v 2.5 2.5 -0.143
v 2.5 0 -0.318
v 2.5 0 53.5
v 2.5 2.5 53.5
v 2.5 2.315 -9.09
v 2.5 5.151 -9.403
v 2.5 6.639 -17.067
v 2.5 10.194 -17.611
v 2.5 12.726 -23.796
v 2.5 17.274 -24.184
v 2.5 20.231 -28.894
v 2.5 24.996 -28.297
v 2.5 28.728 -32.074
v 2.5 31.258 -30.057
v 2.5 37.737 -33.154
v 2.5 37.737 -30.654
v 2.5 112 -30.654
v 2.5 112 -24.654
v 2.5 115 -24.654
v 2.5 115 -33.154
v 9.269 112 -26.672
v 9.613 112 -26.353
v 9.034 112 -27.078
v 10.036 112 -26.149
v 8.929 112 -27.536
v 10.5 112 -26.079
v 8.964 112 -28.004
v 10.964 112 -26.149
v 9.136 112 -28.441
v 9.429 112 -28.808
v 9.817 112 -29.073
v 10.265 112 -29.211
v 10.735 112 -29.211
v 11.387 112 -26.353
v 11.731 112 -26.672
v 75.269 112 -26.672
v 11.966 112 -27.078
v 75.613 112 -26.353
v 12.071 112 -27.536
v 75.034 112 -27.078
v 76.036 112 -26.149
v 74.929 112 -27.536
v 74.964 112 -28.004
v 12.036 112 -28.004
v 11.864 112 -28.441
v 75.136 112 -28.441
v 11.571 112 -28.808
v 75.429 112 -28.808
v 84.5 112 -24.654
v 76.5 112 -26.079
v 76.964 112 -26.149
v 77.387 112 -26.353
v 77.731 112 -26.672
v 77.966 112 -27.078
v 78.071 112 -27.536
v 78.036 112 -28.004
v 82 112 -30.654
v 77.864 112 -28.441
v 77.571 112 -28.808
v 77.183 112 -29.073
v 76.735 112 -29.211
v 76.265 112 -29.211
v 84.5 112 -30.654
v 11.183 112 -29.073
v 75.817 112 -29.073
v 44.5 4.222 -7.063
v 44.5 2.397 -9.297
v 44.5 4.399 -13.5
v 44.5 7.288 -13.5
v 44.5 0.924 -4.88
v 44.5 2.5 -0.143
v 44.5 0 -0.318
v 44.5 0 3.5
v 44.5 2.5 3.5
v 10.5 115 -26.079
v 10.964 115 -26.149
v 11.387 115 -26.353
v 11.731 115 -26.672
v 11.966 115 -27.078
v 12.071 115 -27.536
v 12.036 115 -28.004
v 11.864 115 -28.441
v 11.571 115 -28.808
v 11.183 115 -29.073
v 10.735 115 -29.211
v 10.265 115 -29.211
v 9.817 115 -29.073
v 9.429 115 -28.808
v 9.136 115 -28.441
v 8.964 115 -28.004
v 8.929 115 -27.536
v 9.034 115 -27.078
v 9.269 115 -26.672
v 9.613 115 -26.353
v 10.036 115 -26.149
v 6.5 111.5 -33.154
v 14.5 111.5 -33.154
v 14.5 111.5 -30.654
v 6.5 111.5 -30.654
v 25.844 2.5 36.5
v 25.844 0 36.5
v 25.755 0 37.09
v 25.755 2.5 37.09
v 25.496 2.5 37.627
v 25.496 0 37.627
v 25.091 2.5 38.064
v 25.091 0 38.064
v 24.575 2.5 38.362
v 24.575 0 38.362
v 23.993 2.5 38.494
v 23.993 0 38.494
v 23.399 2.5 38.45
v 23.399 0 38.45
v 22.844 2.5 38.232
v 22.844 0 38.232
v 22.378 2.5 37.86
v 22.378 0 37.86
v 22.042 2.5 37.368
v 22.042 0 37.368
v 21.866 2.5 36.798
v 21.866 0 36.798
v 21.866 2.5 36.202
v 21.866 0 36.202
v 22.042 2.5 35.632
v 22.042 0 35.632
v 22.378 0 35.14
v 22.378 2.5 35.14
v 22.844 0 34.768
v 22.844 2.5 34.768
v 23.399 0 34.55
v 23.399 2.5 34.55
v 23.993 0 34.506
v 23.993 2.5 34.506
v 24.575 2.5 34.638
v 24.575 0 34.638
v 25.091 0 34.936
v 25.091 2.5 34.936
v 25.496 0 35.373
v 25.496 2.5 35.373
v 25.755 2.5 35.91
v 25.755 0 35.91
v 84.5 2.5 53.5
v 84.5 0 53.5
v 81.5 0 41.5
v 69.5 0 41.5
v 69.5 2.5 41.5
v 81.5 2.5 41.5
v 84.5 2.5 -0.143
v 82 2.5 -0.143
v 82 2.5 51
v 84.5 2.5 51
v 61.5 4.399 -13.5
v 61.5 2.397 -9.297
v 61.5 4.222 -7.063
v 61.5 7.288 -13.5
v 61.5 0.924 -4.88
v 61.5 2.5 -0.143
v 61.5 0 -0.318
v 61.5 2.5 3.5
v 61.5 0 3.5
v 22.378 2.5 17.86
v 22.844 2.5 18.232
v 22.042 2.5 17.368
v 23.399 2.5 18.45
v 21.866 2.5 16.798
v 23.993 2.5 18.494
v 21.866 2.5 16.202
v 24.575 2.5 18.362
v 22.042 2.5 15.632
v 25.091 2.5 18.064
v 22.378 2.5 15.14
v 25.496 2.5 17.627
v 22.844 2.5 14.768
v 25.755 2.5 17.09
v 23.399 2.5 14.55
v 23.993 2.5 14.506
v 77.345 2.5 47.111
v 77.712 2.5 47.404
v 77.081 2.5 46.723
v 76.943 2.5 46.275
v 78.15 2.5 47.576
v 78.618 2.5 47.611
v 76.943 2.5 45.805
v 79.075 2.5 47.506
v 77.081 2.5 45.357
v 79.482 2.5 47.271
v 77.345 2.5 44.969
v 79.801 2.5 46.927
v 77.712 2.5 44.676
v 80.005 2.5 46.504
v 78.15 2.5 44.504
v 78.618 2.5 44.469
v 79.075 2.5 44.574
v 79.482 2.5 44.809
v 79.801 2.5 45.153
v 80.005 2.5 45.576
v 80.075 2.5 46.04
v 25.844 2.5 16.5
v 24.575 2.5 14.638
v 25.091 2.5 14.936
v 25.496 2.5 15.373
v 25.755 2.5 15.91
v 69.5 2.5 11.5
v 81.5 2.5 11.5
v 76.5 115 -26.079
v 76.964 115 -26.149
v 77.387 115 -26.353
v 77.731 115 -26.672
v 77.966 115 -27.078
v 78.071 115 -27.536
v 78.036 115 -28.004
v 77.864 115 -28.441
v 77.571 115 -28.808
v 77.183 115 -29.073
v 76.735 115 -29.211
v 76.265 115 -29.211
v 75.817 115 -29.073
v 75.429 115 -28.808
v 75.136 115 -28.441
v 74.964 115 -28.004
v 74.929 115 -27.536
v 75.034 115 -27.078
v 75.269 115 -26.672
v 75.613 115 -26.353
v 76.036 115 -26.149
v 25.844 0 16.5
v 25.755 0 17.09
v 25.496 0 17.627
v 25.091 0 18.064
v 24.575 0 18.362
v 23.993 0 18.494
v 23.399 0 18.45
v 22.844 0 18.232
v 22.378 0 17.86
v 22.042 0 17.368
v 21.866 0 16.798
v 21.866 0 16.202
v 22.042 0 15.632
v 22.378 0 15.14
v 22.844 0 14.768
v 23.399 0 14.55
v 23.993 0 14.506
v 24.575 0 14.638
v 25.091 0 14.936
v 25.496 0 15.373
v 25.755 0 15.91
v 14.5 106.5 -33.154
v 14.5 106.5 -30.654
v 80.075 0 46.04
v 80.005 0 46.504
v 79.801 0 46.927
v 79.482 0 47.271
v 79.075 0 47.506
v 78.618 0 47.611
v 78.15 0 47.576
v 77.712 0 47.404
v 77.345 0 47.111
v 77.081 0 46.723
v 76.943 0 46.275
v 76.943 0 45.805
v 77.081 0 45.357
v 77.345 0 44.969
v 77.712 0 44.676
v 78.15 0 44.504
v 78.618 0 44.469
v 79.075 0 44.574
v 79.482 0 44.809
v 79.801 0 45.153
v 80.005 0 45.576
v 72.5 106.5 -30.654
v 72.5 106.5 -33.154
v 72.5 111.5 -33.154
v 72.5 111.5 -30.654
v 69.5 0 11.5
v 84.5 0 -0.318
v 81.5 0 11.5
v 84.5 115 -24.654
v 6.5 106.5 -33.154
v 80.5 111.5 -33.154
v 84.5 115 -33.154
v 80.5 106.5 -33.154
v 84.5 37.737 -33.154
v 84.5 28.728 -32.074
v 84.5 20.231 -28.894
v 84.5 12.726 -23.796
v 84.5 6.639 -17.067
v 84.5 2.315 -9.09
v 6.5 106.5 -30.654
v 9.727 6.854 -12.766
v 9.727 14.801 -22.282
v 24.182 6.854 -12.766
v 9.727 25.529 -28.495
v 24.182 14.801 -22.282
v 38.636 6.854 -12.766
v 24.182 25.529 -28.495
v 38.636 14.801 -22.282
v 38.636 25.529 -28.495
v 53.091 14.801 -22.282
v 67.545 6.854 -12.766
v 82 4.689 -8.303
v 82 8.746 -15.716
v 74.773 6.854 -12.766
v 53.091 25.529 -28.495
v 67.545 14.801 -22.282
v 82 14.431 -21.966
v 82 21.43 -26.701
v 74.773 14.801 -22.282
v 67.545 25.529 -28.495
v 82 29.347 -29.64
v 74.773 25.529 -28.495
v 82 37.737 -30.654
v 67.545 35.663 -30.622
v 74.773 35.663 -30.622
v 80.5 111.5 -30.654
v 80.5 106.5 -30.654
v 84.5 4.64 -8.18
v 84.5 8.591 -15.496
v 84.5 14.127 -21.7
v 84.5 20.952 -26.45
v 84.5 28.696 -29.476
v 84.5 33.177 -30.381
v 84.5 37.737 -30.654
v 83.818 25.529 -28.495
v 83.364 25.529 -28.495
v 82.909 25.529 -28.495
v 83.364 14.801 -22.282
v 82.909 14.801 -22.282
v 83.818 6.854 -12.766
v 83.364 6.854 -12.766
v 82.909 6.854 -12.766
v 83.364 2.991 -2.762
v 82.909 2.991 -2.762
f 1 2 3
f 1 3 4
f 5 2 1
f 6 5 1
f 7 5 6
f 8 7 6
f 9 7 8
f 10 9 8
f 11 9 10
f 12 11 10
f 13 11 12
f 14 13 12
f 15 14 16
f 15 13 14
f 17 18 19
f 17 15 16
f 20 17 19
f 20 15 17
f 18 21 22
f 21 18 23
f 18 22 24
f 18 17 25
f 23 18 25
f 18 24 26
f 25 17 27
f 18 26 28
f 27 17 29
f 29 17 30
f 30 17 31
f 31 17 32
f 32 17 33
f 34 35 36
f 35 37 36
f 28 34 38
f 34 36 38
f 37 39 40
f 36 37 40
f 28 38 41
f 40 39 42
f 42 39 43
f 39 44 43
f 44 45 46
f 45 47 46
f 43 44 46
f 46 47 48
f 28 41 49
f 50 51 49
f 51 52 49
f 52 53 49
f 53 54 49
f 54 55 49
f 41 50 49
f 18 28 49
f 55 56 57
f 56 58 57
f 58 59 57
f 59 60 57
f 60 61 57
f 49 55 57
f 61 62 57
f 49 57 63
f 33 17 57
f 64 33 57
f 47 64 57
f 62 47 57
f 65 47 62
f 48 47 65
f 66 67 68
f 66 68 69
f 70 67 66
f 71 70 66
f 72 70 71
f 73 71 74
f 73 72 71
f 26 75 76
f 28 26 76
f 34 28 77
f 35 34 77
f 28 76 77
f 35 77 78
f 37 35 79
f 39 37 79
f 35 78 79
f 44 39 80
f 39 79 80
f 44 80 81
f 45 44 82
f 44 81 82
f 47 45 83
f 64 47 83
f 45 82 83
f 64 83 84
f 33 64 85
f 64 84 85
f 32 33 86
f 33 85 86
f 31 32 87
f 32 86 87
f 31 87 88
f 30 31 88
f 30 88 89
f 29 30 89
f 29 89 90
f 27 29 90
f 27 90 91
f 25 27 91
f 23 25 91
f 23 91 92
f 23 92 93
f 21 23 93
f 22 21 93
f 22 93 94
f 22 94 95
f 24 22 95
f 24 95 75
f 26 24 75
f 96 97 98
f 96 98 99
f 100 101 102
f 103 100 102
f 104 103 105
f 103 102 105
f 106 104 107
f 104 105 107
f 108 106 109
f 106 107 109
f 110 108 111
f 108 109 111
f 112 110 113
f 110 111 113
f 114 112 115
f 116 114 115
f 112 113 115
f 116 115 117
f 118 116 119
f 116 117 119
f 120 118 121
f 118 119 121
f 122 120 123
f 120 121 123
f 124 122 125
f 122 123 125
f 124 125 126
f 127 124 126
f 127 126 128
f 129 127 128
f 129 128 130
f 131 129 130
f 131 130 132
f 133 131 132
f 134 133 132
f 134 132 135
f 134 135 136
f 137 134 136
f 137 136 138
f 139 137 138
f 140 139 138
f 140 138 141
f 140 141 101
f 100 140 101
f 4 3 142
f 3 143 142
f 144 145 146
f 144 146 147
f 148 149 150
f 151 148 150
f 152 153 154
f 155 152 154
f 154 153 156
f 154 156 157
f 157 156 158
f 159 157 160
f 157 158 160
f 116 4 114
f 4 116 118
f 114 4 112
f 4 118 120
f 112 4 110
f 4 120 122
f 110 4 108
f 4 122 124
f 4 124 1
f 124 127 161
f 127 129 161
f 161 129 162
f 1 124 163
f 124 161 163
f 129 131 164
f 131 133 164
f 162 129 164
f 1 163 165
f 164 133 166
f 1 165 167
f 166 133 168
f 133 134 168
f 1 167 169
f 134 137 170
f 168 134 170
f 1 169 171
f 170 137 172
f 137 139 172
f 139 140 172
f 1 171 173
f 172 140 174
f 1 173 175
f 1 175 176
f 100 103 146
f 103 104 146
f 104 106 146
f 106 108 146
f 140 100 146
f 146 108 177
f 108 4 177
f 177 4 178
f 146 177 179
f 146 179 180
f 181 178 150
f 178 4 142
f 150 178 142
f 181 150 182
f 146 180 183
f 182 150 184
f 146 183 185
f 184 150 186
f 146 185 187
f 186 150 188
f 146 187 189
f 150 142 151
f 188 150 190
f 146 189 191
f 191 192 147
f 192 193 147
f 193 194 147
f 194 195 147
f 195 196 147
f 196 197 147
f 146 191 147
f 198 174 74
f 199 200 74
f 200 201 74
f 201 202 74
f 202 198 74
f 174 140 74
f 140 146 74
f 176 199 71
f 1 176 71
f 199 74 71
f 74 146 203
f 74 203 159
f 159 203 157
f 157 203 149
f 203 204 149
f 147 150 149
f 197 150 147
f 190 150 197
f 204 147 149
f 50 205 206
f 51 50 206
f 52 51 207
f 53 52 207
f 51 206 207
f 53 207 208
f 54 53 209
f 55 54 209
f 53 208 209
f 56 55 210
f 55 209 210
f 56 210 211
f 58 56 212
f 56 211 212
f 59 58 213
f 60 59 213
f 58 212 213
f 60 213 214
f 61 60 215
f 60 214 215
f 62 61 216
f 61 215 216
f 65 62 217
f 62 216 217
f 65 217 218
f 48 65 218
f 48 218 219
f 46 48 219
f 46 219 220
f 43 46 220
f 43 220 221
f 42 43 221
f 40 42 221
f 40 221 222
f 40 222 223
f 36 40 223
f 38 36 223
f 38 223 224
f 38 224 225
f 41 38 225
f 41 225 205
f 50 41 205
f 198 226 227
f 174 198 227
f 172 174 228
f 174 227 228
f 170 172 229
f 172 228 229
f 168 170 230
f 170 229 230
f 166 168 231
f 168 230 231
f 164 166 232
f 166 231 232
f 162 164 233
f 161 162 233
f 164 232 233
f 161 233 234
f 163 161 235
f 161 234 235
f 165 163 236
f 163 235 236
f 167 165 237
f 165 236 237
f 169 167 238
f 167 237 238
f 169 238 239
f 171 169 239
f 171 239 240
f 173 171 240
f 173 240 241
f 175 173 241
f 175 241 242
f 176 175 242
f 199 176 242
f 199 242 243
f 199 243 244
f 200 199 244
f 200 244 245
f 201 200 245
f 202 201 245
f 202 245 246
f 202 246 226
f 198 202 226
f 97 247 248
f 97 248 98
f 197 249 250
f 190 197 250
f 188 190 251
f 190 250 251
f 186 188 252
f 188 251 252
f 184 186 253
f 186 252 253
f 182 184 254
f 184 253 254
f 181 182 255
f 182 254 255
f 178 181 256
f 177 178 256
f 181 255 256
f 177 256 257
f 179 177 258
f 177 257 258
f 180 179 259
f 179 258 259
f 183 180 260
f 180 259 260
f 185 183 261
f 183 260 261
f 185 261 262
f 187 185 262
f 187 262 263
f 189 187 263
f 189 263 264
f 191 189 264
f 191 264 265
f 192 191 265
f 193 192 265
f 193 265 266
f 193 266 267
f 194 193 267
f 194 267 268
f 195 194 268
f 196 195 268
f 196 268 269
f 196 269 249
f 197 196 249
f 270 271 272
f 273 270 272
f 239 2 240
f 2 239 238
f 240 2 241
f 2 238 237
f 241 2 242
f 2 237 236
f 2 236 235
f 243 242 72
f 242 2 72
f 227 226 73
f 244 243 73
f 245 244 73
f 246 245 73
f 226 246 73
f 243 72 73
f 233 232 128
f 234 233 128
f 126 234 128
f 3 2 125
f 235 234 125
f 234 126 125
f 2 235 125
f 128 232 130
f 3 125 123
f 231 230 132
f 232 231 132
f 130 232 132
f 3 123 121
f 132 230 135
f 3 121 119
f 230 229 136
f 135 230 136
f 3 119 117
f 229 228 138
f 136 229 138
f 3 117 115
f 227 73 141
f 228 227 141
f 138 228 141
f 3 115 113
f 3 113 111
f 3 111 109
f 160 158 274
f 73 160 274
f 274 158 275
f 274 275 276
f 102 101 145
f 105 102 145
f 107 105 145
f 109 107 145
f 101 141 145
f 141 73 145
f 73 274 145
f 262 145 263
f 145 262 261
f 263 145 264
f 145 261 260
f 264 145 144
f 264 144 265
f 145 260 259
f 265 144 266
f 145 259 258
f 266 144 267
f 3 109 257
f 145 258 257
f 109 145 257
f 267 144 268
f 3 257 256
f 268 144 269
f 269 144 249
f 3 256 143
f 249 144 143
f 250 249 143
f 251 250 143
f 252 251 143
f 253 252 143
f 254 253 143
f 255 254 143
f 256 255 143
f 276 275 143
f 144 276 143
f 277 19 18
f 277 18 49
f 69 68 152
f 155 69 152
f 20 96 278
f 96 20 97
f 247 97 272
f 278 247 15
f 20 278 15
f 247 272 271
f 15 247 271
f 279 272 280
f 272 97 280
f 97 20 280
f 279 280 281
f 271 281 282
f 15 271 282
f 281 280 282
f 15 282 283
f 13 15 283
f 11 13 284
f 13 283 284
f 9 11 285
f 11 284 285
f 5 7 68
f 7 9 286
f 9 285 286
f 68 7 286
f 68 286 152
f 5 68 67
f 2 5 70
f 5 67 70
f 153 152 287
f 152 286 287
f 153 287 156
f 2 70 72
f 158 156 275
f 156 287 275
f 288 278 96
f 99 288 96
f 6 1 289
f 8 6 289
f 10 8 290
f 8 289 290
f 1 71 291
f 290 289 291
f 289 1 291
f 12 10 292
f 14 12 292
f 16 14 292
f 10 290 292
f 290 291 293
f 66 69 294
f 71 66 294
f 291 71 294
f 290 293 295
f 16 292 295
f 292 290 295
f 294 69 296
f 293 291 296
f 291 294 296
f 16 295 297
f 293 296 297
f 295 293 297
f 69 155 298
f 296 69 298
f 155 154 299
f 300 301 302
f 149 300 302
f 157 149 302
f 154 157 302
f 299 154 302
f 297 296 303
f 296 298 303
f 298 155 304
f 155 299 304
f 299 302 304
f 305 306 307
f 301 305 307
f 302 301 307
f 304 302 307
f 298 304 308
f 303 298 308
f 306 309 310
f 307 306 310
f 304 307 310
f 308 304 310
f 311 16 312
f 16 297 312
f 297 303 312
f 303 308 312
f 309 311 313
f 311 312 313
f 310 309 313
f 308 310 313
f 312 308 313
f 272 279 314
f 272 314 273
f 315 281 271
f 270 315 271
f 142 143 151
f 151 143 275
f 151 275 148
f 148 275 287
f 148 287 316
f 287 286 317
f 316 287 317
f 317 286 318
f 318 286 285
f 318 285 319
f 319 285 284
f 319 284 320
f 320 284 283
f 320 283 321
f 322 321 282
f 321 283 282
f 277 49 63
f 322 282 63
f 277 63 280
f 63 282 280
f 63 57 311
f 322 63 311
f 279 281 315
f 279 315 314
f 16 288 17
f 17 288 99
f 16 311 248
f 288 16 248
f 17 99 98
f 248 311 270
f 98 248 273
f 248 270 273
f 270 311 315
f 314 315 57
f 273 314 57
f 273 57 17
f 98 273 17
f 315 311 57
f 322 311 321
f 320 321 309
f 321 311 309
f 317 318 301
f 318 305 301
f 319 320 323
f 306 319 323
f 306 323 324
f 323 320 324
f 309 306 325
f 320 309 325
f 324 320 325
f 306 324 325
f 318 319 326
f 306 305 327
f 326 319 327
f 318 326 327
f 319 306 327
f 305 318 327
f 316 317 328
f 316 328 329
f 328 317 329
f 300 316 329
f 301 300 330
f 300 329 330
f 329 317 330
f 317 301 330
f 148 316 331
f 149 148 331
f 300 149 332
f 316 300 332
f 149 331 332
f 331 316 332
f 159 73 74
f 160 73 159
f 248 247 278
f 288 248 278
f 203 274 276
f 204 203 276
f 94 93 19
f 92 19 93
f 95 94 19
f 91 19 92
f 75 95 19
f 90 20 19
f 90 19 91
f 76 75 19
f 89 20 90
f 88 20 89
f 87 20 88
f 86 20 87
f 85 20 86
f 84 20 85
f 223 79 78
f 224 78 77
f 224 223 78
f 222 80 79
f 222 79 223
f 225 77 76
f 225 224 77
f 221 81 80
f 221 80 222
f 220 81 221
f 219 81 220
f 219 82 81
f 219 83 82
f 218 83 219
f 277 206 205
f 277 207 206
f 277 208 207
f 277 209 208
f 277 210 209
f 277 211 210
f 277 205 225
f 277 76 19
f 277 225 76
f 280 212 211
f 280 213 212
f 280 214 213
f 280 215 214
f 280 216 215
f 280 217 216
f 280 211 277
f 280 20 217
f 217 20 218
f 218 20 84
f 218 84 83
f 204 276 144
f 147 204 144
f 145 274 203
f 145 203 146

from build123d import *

# Parameters (mm, degrees)
BOSS_EXTRUDE1_DEPTH      = 50
SKETCH3_W                = 92
SKETCH3_H                = 120
BOSS_EXTRUDE2_DEPTH      = 5
SKETCH4_W                = 8.115199035
SKETCH4_H                = 120
BOSS_EXTRUDE3_DEPTH      = 12
BOSS_EXTRUDE4_DEPTH      = 60
SKETCH5_W                = 10
SKETCH5_H                = 2
BOSS_EXTRUDE5_DEPTH      = 20
BOSS_EXTRUDE6_START      = 50
SKETCH5_2_W              = 10
SKETCH5_2_H              = 2
BOSS_EXTRUDE6_DEPTH      = 20
SKETCH6_W                = 92
SKETCH6_H                = 120
BOSS_EXTRUDE7_DEPTH      = 5
SKETCH7_W                = 7
SKETCH7_H                = 10
SKETCH7_R                = 1.6
BOSS_EXTRUDE8_DEPTH      = 3
CUT_EXTRUDE2_DEPTH       = 164.816971038
SKETCH12_W               = 112.5
SKETCH12_H               = 2.5
CUT_EXTRUDE4_DEPTH       = 165.373051319
CUT_EXTRUDE4_DEPTH_BACK  = 165.373051319
SKETCH14_W               = 106
SKETCH14_H               = 1.5
CUT_EXTRUDE5_DEPTH       = 162.085381087
SKETCH15_R               = 1.6
BOSS_EXTRUDE10_DEPTH     = 2
SKETCH16_W               = 87
SKETCH16_H               = 3.364665628
CUT_EXTRUDE6_DEPTH       = 162.085381087
SKETCH17_W               = 10
SKETCH17_H               = 2
CUT_EXTRUDE7_DEPTH       = 70
SKETCH19_W               = 7
SKETCH19_H               = 10
SKETCH19_R               = 1.6
BOSS_EXTRUDE11_DEPTH     = 3.5
SKETCH21_W               = 7
SKETCH21_H               = 10
SKETCH21_R               = 1.6
BOSS_EXTRUDE13_DEPTH     = 3.5
SKETCH22_W               = 9.5
SKETCH22_H               = 117.5
CUT_EXTRUDE8_DEPTH       = 186.007067988
CUT_EXTRUDE9_DEPTH       = 156.903445849
CUT_EXTRUDE10_START      = -8.115199
SKETCH26_W               = 12
SKETCH26_H               = 12
CUT_EXTRUDE10_DEPTH      = 8.115199
SKETCH27_R               = 1.575
CUT_EXTRUDE11_DEPTH      = 6
SKETCH28_W               = 108.793725607
SKETCH28_H               = 128.432707594
CUT_EXTRUDE12_DEPTH      = 155.300842512
CUT_EXTRUDE13_DEPTH      = 127.920694069
CUT_EXTRUDE14_DEPTH      = 130.130747828
BOSS_EXTRUDE14_DEPTH     = 79.5
SKETCH32_W               = 2.5
SKETCH32_H               = 2.5
CUT_EXTRUDE15_DEPTH      = 153.946069092
SKETCH35_R               = 1.575
CUT_EXTRUDE16_DEPTH      = 153.405708721
SKETCH36_W               = 82
SKETCH36_H               = 3
BOSS_EXTRUDE15_DEPTH     = 6
CUT_EXTRUDE17_REACH      = 154.406
SKETCH37_R               = 1.575
SKETCH38_W               = 17
SKETCH38_H               = 17
CUT_EXTRUDE18_DEPTH      = 153.405708721
CUT_EXTRUDE18_DEPTH_BACK = 153.405708721
SKETCH39_W               = 12
SKETCH39_H               = 30
CUT_EXTRUDE19_DEPTH      = 153.405708721
CUT_EXTRUDE20_REACH      = 168.956
SKETCH40_W               = 8
SKETCH40_H               = 5
CUT_EXTRUDE22_REACH      = 154.406
SKETCH42_R               = 2


with BuildPart() as part:
    # Sketch2 → Boss-Extrude1 (new body)
    with BuildSketch(Plane.XY):
        Polygon((0, 0), (0, 115), (82, 115), (82, 0), (87, 0), (87, 120), (-5, 120), (-5, 0), align=None)
    extrude(amount=BOSS_EXTRUDE1_DEPTH)

    # Sketch3 → Boss-Extrude2 (add)
    with BuildSketch(Plane.XY.offset(50)):
        with Locations((41, 60)):
            Rectangle(SKETCH3_W, SKETCH3_H)
    extrude(amount=BOSS_EXTRUDE2_DEPTH)

    # Sketch4 → Boss-Extrude3 (add)
    with BuildSketch(Plane.ZY.offset(-82)):
        with Locations((45.942400483, 60)):
            Rectangle(SKETCH4_W, SKETCH4_H)
    extrude(amount=BOSS_EXTRUDE3_DEPTH)

    # Sketch2_2 → Boss-Extrude4 (add)
    with BuildSketch(Plane.XY):
        Polygon((0, 0), (0, 115), (82, 115), (82, 0), (87, 0), (87, 120), (-5, 120), (-5, 0), align=None)
    extrude(amount=-BOSS_EXTRUDE4_DEPTH)

    # Sketch5 → Boss-Extrude5 (add)
    with BuildSketch(Plane.XZ.offset(-115)):
        with Locations((5, 7.889828052)):
            Rectangle(SKETCH5_W, SKETCH5_H)
        with Locations((5, 2.689828052)):
            Rectangle(SKETCH5_W, SKETCH5_H)
        with Locations((77, 2.689828052)):
            Rectangle(SKETCH5_W, SKETCH5_H)
        with Locations((77, 7.889828052)):
            Rectangle(SKETCH5_W, SKETCH5_H)
    extrude(amount=BOSS_EXTRUDE5_DEPTH)

    # Sketch5_2 → Boss-Extrude6 (add)
    with BuildSketch(Plane.XZ.offset(-115).offset(BOSS_EXTRUDE6_START)):
        with Locations((5, 7.889828052)):
            Rectangle(SKETCH5_2_W, SKETCH5_2_H)
        with Locations((5, 2.689828052)):
            Rectangle(SKETCH5_2_W, SKETCH5_2_H)
        with Locations((77, 2.689828052)):
            Rectangle(SKETCH5_2_W, SKETCH5_2_H)
        with Locations((77, 7.889828052)):
            Rectangle(SKETCH5_2_W, SKETCH5_2_H)
    extrude(amount=BOSS_EXTRUDE6_DEPTH)

    # Sketch6 → Boss-Extrude7 (add)
    with BuildSketch(Plane(origin=(0, 0, -60), x_dir=(-1, 0, 0), z_dir=(0, 0, -1))):
        with Locations((-41, 60)):
            Rectangle(SKETCH6_W, SKETCH6_H)
    extrude(amount=-BOSS_EXTRUDE7_DEPTH)

    # Sketch7 → Boss-Extrude8 (add)
    with BuildSketch(Plane.XY.offset(55)):
        with Locations((90.5, 115)):
            Rectangle(SKETCH7_W, SKETCH7_H)
        with Locations((90.472155735, 113.006992181)):
            Circle(SKETCH7_R, mode=Mode.SUBTRACT)
        with Locations((-8.5, 115)):
            Rectangle(SKETCH7_W, SKETCH7_H)
        with Locations(Location((-8.472155735, 113.006992181, 0), (0, 0, 180))):
            Circle(SKETCH7_R, mode=Mode.SUBTRACT)
        with Locations((-8.5, 5)):
            Rectangle(SKETCH7_W, SKETCH7_H)
        with Locations((-8.472155735, 6.993007819)):
            Circle(SKETCH7_R, mode=Mode.SUBTRACT)
        with Locations((90.5, 5)):
            Rectangle(SKETCH7_W, SKETCH7_H)
        with Locations(Location((90.472155735, 6.993007819, 0), (0, 0, 180))):
            Circle(SKETCH7_R, mode=Mode.SUBTRACT)
    extrude(amount=-BOSS_EXTRUDE8_DEPTH)

    # Sketch11 → Cut-Extrude2 (cut, through all)
    with BuildSketch(Plane.XZ):
        Polygon((-5, 52), (-2.5, 52), (-2.5, -57.5), (84.5, -57.5), (84.5, 52), (87, 52), (87, -60), (-5, -60), align=None)
    extrude(amount=-CUT_EXTRUDE2_DEPTH, mode=Mode.SUBTRACT)

    # Sketch12 → Cut-Extrude4 (cut, two sides)
    with BuildSketch(Plane.ZY.offset(2.5)) as cut_extrude4_sk:
        with Locations((-1.25, 118.75)):
            Rectangle(SKETCH12_W, SKETCH12_H)
    extrude(amount=CUT_EXTRUDE4_DEPTH, mode=Mode.SUBTRACT)
    extrude(cut_extrude4_sk.sketch, amount=-CUT_EXTRUDE4_DEPTH_BACK, mode=Mode.SUBTRACT)

    # Sketch14 → Cut-Extrude5 (cut, through all)
    with BuildSketch(Plane.XZ):
        with Locations((41, 54.25)):
            Rectangle(SKETCH14_W, SKETCH14_H)
    extrude(amount=-CUT_EXTRUDE5_DEPTH, mode=Mode.SUBTRACT)

    # Sketch15 → Boss-Extrude10 (add)
    with BuildSketch(Plane(origin=(0, 0, 52), x_dir=(-1, 0, 0), z_dir=(0, 0, -1))):
        Polygon((-84.5, 117.5), (-94, 117.5), (-94, 110), (-87, 110), (-87, 10), (-94, 10), (-94, 0), (-84.5, 0), align=None)
        with Locations((-90.472155735, 113.006992181)):
            Circle(SKETCH15_R, mode=Mode.SUBTRACT)
        with Locations((-90.472155735, 6.993007819)):
            Circle(SKETCH15_R, mode=Mode.SUBTRACT)
        Polygon((2.5, 0), (2.5, 117.5), (12, 117.5), (12, 110), (5, 110), (5, 10), (12, 10), (12, 0), align=None)
        with Locations(Location((8.472155735, 113.006992181, 0), (0, 0, 180))):
            Circle(SKETCH15_R, mode=Mode.SUBTRACT)
        with Locations(Location((8.472155735, 6.993007819, 0), (0, 0, 180))):
            Circle(SKETCH15_R, mode=Mode.SUBTRACT)
    extrude(amount=BOSS_EXTRUDE10_DEPTH)

    # Sketch16 → Cut-Extrude6 (cut, through all)
    with BuildSketch(Plane.XZ):
        with Locations((41, -55.817667186)):
            Rectangle(SKETCH16_W, SKETCH16_H)
    extrude(amount=-CUT_EXTRUDE6_DEPTH, mode=Mode.SUBTRACT)

    # Sketch17 → Cut-Extrude7 (cut)
    with BuildSketch(Plane.XZ.offset(-45)):
        with Locations((5, 2.689828052)):
            Rectangle(SKETCH17_W, SKETCH17_H)
        with Locations((77, 2.689828052)):
            Rectangle(SKETCH17_W, SKETCH17_H)
    extrude(amount=-CUT_EXTRUDE7_DEPTH, mode=Mode.SUBTRACT)

    # Sketch19 → Boss-Extrude11 (add)
    with BuildSketch(Plane.XZ):
        with Locations((88, -49.135334372)):
            Rectangle(SKETCH19_W, SKETCH19_H)
        with Locations((87.901562489, -49.234834013)):
            Circle(SKETCH19_R, mode=Mode.SUBTRACT)
        with Locations((-6, -49.135334372)):
            Rectangle(SKETCH19_W, SKETCH19_H)
        with Locations(Location((-5.901562489, -49.234834013, 0), (0, 0, 180))):
            Circle(SKETCH19_R, mode=Mode.SUBTRACT)
        with Locations((-6, 34.080676656)):
            Rectangle(SKETCH19_W, SKETCH19_H)
        with Locations((-5.901562489, 34.180176298)):
            Circle(SKETCH19_R, mode=Mode.SUBTRACT)
        with Locations((88, 34.080676656)):
            Rectangle(SKETCH19_W, SKETCH19_H)
        with Locations(Location((87.901562489, 34.180176298, 0), (0, 0, 180))):
            Circle(SKETCH19_R, mode=Mode.SUBTRACT)
    extrude(amount=-BOSS_EXTRUDE11_DEPTH)

    # Sketch21 → Boss-Extrude13 (add)
    with BuildSketch(Plane(origin=(0, 0, -54.135334372), x_dir=(-1, 0, 0), z_dir=(0, 0, -1))):
        with Locations((-88, 112.5)):
            Rectangle(SKETCH21_W, SKETCH21_H)
        with Locations((-87.460864154, 112.996655596)):
            Circle(SKETCH21_R, mode=Mode.SUBTRACT)
        with Locations((6, 112.5)):
            Rectangle(SKETCH21_W, SKETCH21_H)
        with Locations(Location((5.460864154, 112.996655596, 0), (0, 0, 180))):
            Circle(SKETCH21_R, mode=Mode.SUBTRACT)
        with Locations((6, 17.859776919)):
            Rectangle(SKETCH21_W, SKETCH21_H)
        with Locations((5.460864154, 17.363121322)):
            Circle(SKETCH21_R, mode=Mode.SUBTRACT)
        with Locations((-88, 17.859776919)):
            Rectangle(SKETCH21_W, SKETCH21_H)
        with Locations(Location((-87.460864154, 17.363121322, 0), (0, 0, 180))):
            Circle(SKETCH21_R, mode=Mode.SUBTRACT)
    extrude(amount=-BOSS_EXTRUDE13_DEPTH)

    # Sketch22 → Cut-Extrude8 (cut, through all)
    with BuildSketch(Plane(origin=(0, 0, -54.135334372), x_dir=(-1, 0, 0), z_dir=(0, 0, -1))):
        with Locations((7.25, 58.75)):
            Rectangle(SKETCH22_W, SKETCH22_H)
        with Locations((-89.25, 58.75)):
            Rectangle(SKETCH22_W, SKETCH22_H)
    extrude(amount=-CUT_EXTRUDE8_DEPTH, mode=Mode.SUBTRACT)

    # Sketch24 → Cut-Extrude9 (cut, through all)
    with BuildSketch(Plane.ZY.offset(2.5)):
        with BuildLine():
            Line((-33.153862192, 117.5), (-33.153862192, 37.737088179))
            ThreePointArc((-33.153862192, 37.737088179), (-23.795591024, 12.725573197), (-0.317667186, 0))
            Line((-0.317667186, 0), (-54.135334372, 0))
            Line((-54.135334372, 0), (-54.135334372, 117.5))
            Line((-54.135334372, 117.5), (-33.153862192, 117.5))
        make_face()
    extrude(amount=-CUT_EXTRUDE9_DEPTH, mode=Mode.SUBTRACT)

    # Sketch26 → Cut-Extrude10 (cut)
    with BuildSketch(Plane(origin=(0, 0, 41.884800965), x_dir=(-1, 0, 0), z_dir=(0, 0, -1)).offset(CUT_EXTRUDE10_START)):
        with Locations((-76, 12)):
            Rectangle(SKETCH26_W, SKETCH26_H)
    extrude(amount=CUT_EXTRUDE10_DEPTH, mode=Mode.SUBTRACT)

    # Sketch27 → Cut-Extrude11 (cut)
    with BuildSketch(Plane.XZ):
        with Locations((76, 46.036602525)):
            Circle(SKETCH27_R)
    extrude(amount=-CUT_EXTRUDE11_DEPTH, mode=Mode.SUBTRACT)

    # Sketch28 → Cut-Extrude12 (cut, through all)
    with BuildSketch(Plane.ZY.offset(-82)):
        with Locations((9.705474095, 56.879620763)):
            Rectangle(SKETCH28_W, SKETCH28_H)
    extrude(amount=CUT_EXTRUDE12_DEPTH, mode=Mode.SUBTRACT)

    # 3DSketch1 → Cut-Extrude13 (cut, through all)
    with BuildSketch(Plane(origin=(82, 2.5, -0.143383403), x_dir=(0, 0.9103450776109693, 0.41385002074360044), z_dir=(-1, 0, 0))):
        with BuildLine():
            Line((0, 0), (21.165690282, -46.558127334))
            Line((21.165690282, -46.558127334), (123.579511514, 0))
            Line((123.579511514, 0), (89.787058952, 74.333191514))
            Line((89.787058952, 74.333191514), (19.451147493, 42.357933854))
            add(Edge.make_bspline(
                [(19.451147493, 42.357933854), (19.073503164, 42.186253777), (18.695858835, 42.0145737), (18.319593589, 41.840000931), (17.199072345, 41.298926476), (16.11578633, 40.679749356), (15.408613466, 40.238696045), (13.674397883, 39.081500683), (12.014903876, 37.828173433), (11.050269163, 37.039177313), (9.191446964, 35.382400956), (7.490166914, 33.558487206), (6.680531728, 32.608352946), (5.146509637, 30.638943579), (3.789461316, 28.545680375), (3.156882667, 27.470506499), (1.98702053, 25.26791657), (1.014556989, 22.97052703), (0.57888296, 21.801225298), (-0.188933435, 19.427593794), (-0.744854137, 16.996277974), (-0.9697392, 15.769218079), (-1.313156023, 13.298332506), (-1.443460783, 10.805991744), (-1.45351547, 9.557983588), (-1.372539383, 7.404412729), (-1.116186803, 5.266410588), (-0.980158798, 4.36913409), (-0.731931827, 2.991727413), (-0.431750654, 1.625547457), (-0.317973289, 1.147373929), (-0.183595556, 0.63163023), (-0.035183671, 0.119959589), (-0.023505149, 0.079958731), (-0.011772046, 0.039973715), (0, 0)],
                knots=[0, 0, 0, 0, 0, 0, 0.040869514, 0.040869514, 0.040869514, 0.122608541, 0.122608541, 0.122608541, 0.245217083, 0.245217083, 0.245217083, 0.367825624, 0.367825624, 0.367825624, 0.490434166, 0.490434166, 0.490434166, 0.613042707, 0.613042707, 0.613042707, 0.735651248, 0.735651248, 0.735651248, 0.85825979, 0.85825979, 0.85825979, 0.947511927, 0.947511927, 0.947511927, 0.995894551, 0.995894551, 0.995894551, 1, 1, 1, 1, 1, 1], degree=5))
        make_face()
    extrude(amount=-CUT_EXTRUDE13_DEPTH, mode=Mode.SUBTRACT)

    # Sketch29 → Cut-Extrude14 (cut, through all)
    with BuildSketch(Plane.ZY.offset(-82)):
        Polygon((-30.653862192, 115), (-30.653862192, 117.5), (53.5, 117.5), (53.5, 2.5), (51, 2.5), (51, 115), align=None)
    extrude(amount=-CUT_EXTRUDE14_DEPTH, mode=Mode.SUBTRACT)

    # Sketch31 → Boss-Extrude14 (add)
    with BuildSketch(Plane.ZY.offset(-82)):
        with BuildLine():
            Line((-30.653862192, 37.737088179), (-30.653862192, 117.5))
            Line((-30.653862192, 117.5), (-33.153862192, 117.5))
            Line((-33.153862192, 117.5), (-33.153862192, 37.737088179))
            ThreePointArc((-33.153862192, 37.737088179), (-23.795591024, 12.725573197), (-0.317667186, 0))
            Line((-0.317667186, 0), (53.5, 0))
            Line((53.5, 0), (53.5, 2.5))
            Line((53.5, 2.5), (-0.143383403, 2.5))
            add(Edge.make_bspline(
                [(-0.143383403, 2.5), (-0.184645139, 2.505826499), (-0.225901047, 2.511693126), (-0.267148788, 2.517615997), (-0.794365899, 2.594264873), (-1.319482864, 2.685375306), (-1.801872547, 2.779690766), (-3.169797729, 3.071815916), (-4.526441855, 3.415883496), (-5.399568291, 3.66338897), (-7.451979536, 4.31483189), (-9.445984122, 5.132371053), (-10.577941071, 5.658012489), (-12.792904588, 6.808090062), (-14.900140047, 8.143293922), (-15.924119294, 8.855835695), (-17.907387889, 10.368115472), (-19.750450814, 12.049420794), (-20.634615184, 12.929950049), (-22.323578387, 14.766002155), (-23.844547817, 16.742522281), (-24.561534376, 17.763347871), (-25.905511754, 19.865027151), (-27.063498802, 22.076556717), (-27.593381311, 23.206817207), (-28.549697431, 25.510395869), (-29.288662027, 27.888222438), (-29.607706664, 29.092898961), (-30.061885328, 31.12230067), (-30.397627275, 33.179940614), (-30.506474481, 34.006241873), (-30.621821385, 35.248652427), (-30.650658111, 36.4926371), (-30.653862192, 36.907415259), (-30.653862192, 37.322251719), (-30.653862192, 37.737088179)],
                knots=[0, 0, 0, 0, 0, 0, 0.004105449, 0.004105449, 0.004105449, 0.052488073, 0.052488073, 0.052488073, 0.14174021, 0.14174021, 0.14174021, 0.264348752, 0.264348752, 0.264348752, 0.386957293, 0.386957293, 0.386957293, 0.509565834, 0.509565834, 0.509565834, 0.632174376, 0.632174376, 0.632174376, 0.754782917, 0.754782917, 0.754782917, 0.877391459, 0.877391459, 0.877391459, 0.959130486, 0.959130486, 0.959130486, 1, 1, 1, 1, 1, 1], degree=5))
        make_face()
    extrude(amount=BOSS_EXTRUDE14_DEPTH)

    # Sketch32 → Cut-Extrude15 (cut, through all)
    with BuildSketch(Plane.ZY.offset(-2.5)):
        with Locations((-31.903862192, 116.25)):
            Rectangle(SKETCH32_W, SKETCH32_H)
    extrude(amount=-CUT_EXTRUDE15_DEPTH, mode=Mode.SUBTRACT)

    # Sketch35 → Cut-Extrude16 (cut, through all)
    with BuildSketch(Plane.XZ):
        with Locations((78.5, 46.04)):
            Circle(SKETCH35_R)
    extrude(amount=-CUT_EXTRUDE16_DEPTH, mode=Mode.SUBTRACT)

    # Sketch36 → Boss-Extrude15 (add)
    with BuildSketch(Plane.XY.offset(-30.653862192)):
        with Locations((43.5, 113.5)):
            Rectangle(SKETCH36_W, SKETCH36_H)
    extrude(amount=BOSS_EXTRUDE15_DEPTH)

    # Sketch37 → Cut-Extrude17 (cut, up to next)
    with BuildSketch(Plane(origin=(0, 115, 0), x_dir=(1, 0, 0), z_dir=(0, 1, 0)), mode=Mode.PRIVATE) as cut_extrude17_sk1:
        with Locations(Location((10.5, 27.653862192, 0), (0, 0, 270))):
            Circle(SKETCH37_R)
    cut_extrude17_tool1 = extrude(cut_extrude17_sk1.sketch, amount=-CUT_EXTRUDE17_REACH, mode=Mode.PRIVATE) & part.part
    # Sketch37 → Cut-Extrude17 (cut, up to next)
    with BuildSketch(Plane(origin=(0, 115, 0), x_dir=(1, 0, 0), z_dir=(0, 1, 0)), mode=Mode.PRIVATE) as cut_extrude17_sk2:
        with Locations(Location((76.5, 27.653862192, 0), (0, 0, 270))):
            Circle(SKETCH37_R)
    cut_extrude17_tool2 = extrude(cut_extrude17_sk2.sketch, amount=-CUT_EXTRUDE17_REACH, mode=Mode.PRIVATE) & part.part
    add(cut_extrude17_tool1.solids().sort_by_distance((10.5, 115, -27.653862))[0], mode=Mode.SUBTRACT)
    add(cut_extrude17_tool2.solids().sort_by_distance((76.5, 115, -27.653862))[0], mode=Mode.SUBTRACT)

    # Sketch38 → Cut-Extrude18 (cut, two sides)
    with BuildSketch(Plane.XZ) as cut_extrude18_sk:
        with Locations((53, -5)):
            Rectangle(SKETCH38_W, SKETCH38_H)
    extrude(amount=CUT_EXTRUDE18_DEPTH, mode=Mode.SUBTRACT)
    extrude(cut_extrude18_sk.sketch, amount=-CUT_EXTRUDE18_DEPTH_BACK, mode=Mode.SUBTRACT)

    # Sketch39 → Cut-Extrude19 (cut, through all)
    with BuildSketch(Plane.XZ):
        with Locations((75.5, 26.5)):
            Rectangle(SKETCH39_W, SKETCH39_H)
    extrude(amount=-CUT_EXTRUDE19_DEPTH, mode=Mode.SUBTRACT)

    # Sketch40 → Cut-Extrude20 (cut, up to next)
    with BuildSketch(Plane(origin=(0, 0, -33.153862192), x_dir=(-1, 0, 0), z_dir=(0, 0, -1)), mode=Mode.PRIVATE) as cut_extrude20_sk1:
        with Locations((-76.5, 109)):
            Rectangle(SKETCH40_W, SKETCH40_H)
    cut_extrude20_tool1 = extrude(cut_extrude20_sk1.sketch, amount=-CUT_EXTRUDE20_REACH, mode=Mode.PRIVATE) & part.part
    # Sketch40 → Cut-Extrude20 (cut, up to next)
    with BuildSketch(Plane(origin=(0, 0, -33.153862192), x_dir=(-1, 0, 0), z_dir=(0, 0, -1)), mode=Mode.PRIVATE) as cut_extrude20_sk2:
        with Locations((-10.5, 109)):
            Rectangle(SKETCH40_W, SKETCH40_H)
    cut_extrude20_tool2 = extrude(cut_extrude20_sk2.sketch, amount=-CUT_EXTRUDE20_REACH, mode=Mode.PRIVATE) & part.part
    add(cut_extrude20_tool1.solids().sort_by_distance((76.5, 109, -33.153862))[0], mode=Mode.SUBTRACT)
    add(cut_extrude20_tool2.solids().sort_by_distance((10.5, 109, -33.153862))[0], mode=Mode.SUBTRACT)

    # Sketch42 → Cut-Extrude22 (cut, up to next)
    with BuildSketch(Plane.XZ, mode=Mode.PRIVATE) as cut_extrude22_sk1:
        with Locations((23.844019172, 36.5)):
            Circle(SKETCH42_R)
    cut_extrude22_tool1 = extrude(cut_extrude22_sk1.sketch, amount=-CUT_EXTRUDE22_REACH, mode=Mode.PRIVATE) & part.part
    # Sketch42 → Cut-Extrude22 (cut, up to next)
    with BuildSketch(Plane.XZ, mode=Mode.PRIVATE) as cut_extrude22_sk2:
        with Locations((23.844019172, 16.5)):
            Circle(SKETCH42_R)
    cut_extrude22_tool2 = extrude(cut_extrude22_sk2.sketch, amount=-CUT_EXTRUDE22_REACH, mode=Mode.PRIVATE) & part.part
    add(cut_extrude22_tool1.solids().sort_by_distance((23.844019, 0, 36.5))[0], mode=Mode.SUBTRACT)
    add(cut_extrude22_tool2.solids().sort_by_distance((23.844019, 0, 16.5))[0], mode=Mode.SUBTRACT)


solid = part.part
